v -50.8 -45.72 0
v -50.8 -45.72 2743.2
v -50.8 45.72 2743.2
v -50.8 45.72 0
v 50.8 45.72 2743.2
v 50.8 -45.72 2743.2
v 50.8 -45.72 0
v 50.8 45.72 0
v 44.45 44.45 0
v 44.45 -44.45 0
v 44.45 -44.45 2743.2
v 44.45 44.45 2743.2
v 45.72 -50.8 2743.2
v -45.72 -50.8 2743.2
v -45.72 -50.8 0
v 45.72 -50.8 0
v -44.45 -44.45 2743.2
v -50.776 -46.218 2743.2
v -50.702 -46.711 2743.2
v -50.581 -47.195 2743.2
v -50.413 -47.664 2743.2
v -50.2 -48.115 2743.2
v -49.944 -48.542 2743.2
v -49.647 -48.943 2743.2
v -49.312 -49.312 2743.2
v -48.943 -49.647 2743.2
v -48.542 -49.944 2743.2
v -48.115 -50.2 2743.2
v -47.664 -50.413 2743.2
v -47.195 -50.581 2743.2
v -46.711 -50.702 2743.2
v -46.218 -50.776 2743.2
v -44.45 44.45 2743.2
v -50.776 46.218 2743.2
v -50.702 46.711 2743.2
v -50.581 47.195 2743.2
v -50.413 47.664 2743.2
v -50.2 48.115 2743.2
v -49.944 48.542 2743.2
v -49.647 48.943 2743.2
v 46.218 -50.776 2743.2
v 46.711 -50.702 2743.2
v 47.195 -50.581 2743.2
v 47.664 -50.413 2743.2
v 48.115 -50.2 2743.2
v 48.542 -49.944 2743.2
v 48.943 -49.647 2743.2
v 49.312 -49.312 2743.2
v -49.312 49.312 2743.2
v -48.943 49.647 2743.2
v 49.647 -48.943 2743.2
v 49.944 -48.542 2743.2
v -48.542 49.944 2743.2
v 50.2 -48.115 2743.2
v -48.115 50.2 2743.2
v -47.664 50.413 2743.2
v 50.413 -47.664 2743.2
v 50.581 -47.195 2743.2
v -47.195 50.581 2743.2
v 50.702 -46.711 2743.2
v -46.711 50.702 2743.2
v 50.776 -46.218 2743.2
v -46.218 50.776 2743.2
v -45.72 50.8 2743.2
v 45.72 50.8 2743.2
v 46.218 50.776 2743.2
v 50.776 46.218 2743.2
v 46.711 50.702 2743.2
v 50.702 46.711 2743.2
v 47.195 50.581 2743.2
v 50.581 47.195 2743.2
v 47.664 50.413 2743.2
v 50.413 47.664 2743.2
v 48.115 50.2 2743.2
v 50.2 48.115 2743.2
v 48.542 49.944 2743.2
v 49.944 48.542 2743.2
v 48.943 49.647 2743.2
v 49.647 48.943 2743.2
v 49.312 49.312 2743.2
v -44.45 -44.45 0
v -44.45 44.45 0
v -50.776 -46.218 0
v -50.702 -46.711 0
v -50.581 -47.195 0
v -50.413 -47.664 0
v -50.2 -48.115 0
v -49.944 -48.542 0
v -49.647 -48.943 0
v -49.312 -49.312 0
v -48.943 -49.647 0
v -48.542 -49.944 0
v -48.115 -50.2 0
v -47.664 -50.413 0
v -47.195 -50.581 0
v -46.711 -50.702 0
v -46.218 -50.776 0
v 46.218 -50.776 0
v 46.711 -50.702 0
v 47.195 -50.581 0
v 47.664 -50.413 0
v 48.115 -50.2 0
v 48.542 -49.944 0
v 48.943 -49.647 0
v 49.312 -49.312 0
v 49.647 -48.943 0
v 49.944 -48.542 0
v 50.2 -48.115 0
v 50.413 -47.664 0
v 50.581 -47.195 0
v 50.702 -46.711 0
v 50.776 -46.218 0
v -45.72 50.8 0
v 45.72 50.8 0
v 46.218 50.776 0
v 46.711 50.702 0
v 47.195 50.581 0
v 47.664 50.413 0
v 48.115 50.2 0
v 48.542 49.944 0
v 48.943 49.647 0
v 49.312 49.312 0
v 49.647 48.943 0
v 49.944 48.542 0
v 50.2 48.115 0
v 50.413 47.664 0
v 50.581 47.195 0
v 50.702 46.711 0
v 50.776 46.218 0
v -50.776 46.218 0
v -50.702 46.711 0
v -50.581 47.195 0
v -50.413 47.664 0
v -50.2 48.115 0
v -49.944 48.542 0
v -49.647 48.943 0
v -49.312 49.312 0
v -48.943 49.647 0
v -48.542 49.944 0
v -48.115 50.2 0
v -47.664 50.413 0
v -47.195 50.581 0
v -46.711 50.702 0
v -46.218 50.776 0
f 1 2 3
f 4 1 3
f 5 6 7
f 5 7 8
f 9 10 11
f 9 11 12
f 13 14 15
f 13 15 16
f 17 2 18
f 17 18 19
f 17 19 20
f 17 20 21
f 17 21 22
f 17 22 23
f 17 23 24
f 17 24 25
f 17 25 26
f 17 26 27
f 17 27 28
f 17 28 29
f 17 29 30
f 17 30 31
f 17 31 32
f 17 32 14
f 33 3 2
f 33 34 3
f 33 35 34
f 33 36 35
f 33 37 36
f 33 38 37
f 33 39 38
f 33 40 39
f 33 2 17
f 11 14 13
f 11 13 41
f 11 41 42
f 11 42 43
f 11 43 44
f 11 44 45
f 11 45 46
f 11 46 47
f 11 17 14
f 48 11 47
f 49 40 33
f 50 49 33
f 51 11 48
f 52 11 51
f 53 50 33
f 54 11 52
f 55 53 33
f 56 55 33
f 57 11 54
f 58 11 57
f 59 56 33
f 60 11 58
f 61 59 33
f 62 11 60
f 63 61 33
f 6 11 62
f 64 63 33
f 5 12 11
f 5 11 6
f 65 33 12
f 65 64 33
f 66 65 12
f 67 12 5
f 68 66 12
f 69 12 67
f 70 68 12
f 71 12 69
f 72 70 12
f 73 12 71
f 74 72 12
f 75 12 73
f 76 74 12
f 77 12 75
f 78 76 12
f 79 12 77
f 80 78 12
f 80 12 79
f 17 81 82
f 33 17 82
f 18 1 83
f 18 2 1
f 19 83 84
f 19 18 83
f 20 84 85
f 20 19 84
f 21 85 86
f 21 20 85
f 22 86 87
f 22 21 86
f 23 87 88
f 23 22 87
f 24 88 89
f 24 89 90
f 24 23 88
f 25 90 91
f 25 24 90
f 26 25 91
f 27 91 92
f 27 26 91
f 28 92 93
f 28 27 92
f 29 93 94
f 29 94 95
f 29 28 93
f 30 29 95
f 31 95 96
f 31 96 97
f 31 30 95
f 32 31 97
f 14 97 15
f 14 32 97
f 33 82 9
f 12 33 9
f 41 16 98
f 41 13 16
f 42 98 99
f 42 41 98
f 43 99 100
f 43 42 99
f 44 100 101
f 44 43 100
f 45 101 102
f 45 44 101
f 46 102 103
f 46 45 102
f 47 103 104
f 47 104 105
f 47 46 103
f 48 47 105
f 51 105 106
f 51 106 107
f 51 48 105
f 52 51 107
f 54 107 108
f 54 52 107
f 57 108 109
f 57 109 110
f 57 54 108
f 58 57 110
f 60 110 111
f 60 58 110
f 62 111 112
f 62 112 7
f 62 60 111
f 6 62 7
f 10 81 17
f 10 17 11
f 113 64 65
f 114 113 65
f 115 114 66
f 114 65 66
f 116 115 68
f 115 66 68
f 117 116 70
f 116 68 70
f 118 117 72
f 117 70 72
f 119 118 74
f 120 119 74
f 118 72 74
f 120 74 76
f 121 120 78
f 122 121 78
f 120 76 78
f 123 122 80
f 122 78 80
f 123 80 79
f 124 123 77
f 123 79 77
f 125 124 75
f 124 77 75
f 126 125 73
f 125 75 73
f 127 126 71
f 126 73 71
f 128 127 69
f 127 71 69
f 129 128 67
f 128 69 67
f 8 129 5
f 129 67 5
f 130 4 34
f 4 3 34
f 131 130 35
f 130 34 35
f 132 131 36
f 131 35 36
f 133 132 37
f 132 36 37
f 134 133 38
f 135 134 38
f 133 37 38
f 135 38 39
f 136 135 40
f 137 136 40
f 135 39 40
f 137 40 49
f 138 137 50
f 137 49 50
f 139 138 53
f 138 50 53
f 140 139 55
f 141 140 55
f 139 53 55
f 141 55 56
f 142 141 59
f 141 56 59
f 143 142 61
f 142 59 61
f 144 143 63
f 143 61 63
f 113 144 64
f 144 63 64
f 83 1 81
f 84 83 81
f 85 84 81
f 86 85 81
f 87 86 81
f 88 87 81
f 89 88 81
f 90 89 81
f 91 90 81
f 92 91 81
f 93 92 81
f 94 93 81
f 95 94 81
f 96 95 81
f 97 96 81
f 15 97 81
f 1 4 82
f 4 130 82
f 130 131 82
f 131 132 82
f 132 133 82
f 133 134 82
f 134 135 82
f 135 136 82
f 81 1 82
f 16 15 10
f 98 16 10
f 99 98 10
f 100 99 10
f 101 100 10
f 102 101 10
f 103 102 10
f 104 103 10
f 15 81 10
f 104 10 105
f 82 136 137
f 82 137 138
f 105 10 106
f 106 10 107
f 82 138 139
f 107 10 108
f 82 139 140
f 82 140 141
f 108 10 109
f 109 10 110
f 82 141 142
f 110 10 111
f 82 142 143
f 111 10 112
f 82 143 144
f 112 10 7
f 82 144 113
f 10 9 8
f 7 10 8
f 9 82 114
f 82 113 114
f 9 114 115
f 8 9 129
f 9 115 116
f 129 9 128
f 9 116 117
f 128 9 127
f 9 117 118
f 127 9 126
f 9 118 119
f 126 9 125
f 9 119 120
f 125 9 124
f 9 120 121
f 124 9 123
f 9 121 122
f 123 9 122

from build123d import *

# Parameters (mm, degrees)
F0_W     = 101.6
F0_H     = 101.6
F1_DEPTH = 2743.2
F2_W     = 88.9
F2_H     = 88.9
F3_DEPTH = 2743.201
F4_R     = 5.08


with BuildPart() as f1:
    # F0 (on Top) → F1 (new body)
    with BuildSketch(Plane.XY):
        Rectangle(F0_W, F0_H)
    extrude(amount=F1_DEPTH)

    # F2 (on face) → F3 (cut, through all)
    with BuildSketch(Plane.XY.offset(2743.2)):
        Rectangle(F2_W, F2_H)
    extrude(amount=-F3_DEPTH, mode=Mode.SUBTRACT)

    # F4
    f4_edges = [f1.edges().sort_by_distance(p)[0] for p in [
        (50.8, -50.8, 1371.6),
        (50.8, 50.8, 1371.6),
        (-50.8, -50.8, 1371.6),
        (-50.8, 50.8, 1371.6),
    ]]
    fillet(f4_edges, radius=F4_R)


solid = f1.part
